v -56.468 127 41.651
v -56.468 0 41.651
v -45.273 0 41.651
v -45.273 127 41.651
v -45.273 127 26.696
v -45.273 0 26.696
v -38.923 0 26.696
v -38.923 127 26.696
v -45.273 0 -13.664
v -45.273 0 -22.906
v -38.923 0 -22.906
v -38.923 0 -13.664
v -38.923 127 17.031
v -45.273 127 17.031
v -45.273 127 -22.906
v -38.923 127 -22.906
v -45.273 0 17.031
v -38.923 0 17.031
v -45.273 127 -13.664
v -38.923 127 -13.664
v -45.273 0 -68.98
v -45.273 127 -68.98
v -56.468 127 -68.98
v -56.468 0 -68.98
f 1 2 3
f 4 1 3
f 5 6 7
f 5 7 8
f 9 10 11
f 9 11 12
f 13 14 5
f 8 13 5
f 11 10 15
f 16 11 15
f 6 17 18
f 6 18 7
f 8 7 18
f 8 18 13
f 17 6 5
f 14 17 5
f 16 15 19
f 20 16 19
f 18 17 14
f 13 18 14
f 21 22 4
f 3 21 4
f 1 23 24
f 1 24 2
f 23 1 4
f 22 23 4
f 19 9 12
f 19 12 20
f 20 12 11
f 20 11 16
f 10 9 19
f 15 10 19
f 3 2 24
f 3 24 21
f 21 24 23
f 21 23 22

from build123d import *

# Parameters (mm, degrees)
F0_W     = 11.194817
F0_H     = 110.631112
F1_DEPTH = 127
F2_W     = 127
F2_H     = 9.664305
F2_H_2   = 9.241795
F3_DEPTH = 6.35


with BuildPart() as f1:
    # F0 (on Front) → F1 (new body)
    with BuildSketch(Plane.XZ):
        with Locations((-50.870556, -13.664259)):
            Rectangle(F0_W, F0_H)
    extrude(amount=-F1_DEPTH)


with BuildPart() as f3:
    # F2 (on face) → F3 (new body)
    with BuildSketch(Plane.YZ.offset(-45.273148)):
        with Locations((63.5, 21.863432)):
            Rectangle(F2_W, F2_H)
        with Locations((63.5, -18.285156)):
            Rectangle(F2_W, F2_H_2)
    extrude(amount=F3_DEPTH)


solid = Compound([f1.part, f3.part])
